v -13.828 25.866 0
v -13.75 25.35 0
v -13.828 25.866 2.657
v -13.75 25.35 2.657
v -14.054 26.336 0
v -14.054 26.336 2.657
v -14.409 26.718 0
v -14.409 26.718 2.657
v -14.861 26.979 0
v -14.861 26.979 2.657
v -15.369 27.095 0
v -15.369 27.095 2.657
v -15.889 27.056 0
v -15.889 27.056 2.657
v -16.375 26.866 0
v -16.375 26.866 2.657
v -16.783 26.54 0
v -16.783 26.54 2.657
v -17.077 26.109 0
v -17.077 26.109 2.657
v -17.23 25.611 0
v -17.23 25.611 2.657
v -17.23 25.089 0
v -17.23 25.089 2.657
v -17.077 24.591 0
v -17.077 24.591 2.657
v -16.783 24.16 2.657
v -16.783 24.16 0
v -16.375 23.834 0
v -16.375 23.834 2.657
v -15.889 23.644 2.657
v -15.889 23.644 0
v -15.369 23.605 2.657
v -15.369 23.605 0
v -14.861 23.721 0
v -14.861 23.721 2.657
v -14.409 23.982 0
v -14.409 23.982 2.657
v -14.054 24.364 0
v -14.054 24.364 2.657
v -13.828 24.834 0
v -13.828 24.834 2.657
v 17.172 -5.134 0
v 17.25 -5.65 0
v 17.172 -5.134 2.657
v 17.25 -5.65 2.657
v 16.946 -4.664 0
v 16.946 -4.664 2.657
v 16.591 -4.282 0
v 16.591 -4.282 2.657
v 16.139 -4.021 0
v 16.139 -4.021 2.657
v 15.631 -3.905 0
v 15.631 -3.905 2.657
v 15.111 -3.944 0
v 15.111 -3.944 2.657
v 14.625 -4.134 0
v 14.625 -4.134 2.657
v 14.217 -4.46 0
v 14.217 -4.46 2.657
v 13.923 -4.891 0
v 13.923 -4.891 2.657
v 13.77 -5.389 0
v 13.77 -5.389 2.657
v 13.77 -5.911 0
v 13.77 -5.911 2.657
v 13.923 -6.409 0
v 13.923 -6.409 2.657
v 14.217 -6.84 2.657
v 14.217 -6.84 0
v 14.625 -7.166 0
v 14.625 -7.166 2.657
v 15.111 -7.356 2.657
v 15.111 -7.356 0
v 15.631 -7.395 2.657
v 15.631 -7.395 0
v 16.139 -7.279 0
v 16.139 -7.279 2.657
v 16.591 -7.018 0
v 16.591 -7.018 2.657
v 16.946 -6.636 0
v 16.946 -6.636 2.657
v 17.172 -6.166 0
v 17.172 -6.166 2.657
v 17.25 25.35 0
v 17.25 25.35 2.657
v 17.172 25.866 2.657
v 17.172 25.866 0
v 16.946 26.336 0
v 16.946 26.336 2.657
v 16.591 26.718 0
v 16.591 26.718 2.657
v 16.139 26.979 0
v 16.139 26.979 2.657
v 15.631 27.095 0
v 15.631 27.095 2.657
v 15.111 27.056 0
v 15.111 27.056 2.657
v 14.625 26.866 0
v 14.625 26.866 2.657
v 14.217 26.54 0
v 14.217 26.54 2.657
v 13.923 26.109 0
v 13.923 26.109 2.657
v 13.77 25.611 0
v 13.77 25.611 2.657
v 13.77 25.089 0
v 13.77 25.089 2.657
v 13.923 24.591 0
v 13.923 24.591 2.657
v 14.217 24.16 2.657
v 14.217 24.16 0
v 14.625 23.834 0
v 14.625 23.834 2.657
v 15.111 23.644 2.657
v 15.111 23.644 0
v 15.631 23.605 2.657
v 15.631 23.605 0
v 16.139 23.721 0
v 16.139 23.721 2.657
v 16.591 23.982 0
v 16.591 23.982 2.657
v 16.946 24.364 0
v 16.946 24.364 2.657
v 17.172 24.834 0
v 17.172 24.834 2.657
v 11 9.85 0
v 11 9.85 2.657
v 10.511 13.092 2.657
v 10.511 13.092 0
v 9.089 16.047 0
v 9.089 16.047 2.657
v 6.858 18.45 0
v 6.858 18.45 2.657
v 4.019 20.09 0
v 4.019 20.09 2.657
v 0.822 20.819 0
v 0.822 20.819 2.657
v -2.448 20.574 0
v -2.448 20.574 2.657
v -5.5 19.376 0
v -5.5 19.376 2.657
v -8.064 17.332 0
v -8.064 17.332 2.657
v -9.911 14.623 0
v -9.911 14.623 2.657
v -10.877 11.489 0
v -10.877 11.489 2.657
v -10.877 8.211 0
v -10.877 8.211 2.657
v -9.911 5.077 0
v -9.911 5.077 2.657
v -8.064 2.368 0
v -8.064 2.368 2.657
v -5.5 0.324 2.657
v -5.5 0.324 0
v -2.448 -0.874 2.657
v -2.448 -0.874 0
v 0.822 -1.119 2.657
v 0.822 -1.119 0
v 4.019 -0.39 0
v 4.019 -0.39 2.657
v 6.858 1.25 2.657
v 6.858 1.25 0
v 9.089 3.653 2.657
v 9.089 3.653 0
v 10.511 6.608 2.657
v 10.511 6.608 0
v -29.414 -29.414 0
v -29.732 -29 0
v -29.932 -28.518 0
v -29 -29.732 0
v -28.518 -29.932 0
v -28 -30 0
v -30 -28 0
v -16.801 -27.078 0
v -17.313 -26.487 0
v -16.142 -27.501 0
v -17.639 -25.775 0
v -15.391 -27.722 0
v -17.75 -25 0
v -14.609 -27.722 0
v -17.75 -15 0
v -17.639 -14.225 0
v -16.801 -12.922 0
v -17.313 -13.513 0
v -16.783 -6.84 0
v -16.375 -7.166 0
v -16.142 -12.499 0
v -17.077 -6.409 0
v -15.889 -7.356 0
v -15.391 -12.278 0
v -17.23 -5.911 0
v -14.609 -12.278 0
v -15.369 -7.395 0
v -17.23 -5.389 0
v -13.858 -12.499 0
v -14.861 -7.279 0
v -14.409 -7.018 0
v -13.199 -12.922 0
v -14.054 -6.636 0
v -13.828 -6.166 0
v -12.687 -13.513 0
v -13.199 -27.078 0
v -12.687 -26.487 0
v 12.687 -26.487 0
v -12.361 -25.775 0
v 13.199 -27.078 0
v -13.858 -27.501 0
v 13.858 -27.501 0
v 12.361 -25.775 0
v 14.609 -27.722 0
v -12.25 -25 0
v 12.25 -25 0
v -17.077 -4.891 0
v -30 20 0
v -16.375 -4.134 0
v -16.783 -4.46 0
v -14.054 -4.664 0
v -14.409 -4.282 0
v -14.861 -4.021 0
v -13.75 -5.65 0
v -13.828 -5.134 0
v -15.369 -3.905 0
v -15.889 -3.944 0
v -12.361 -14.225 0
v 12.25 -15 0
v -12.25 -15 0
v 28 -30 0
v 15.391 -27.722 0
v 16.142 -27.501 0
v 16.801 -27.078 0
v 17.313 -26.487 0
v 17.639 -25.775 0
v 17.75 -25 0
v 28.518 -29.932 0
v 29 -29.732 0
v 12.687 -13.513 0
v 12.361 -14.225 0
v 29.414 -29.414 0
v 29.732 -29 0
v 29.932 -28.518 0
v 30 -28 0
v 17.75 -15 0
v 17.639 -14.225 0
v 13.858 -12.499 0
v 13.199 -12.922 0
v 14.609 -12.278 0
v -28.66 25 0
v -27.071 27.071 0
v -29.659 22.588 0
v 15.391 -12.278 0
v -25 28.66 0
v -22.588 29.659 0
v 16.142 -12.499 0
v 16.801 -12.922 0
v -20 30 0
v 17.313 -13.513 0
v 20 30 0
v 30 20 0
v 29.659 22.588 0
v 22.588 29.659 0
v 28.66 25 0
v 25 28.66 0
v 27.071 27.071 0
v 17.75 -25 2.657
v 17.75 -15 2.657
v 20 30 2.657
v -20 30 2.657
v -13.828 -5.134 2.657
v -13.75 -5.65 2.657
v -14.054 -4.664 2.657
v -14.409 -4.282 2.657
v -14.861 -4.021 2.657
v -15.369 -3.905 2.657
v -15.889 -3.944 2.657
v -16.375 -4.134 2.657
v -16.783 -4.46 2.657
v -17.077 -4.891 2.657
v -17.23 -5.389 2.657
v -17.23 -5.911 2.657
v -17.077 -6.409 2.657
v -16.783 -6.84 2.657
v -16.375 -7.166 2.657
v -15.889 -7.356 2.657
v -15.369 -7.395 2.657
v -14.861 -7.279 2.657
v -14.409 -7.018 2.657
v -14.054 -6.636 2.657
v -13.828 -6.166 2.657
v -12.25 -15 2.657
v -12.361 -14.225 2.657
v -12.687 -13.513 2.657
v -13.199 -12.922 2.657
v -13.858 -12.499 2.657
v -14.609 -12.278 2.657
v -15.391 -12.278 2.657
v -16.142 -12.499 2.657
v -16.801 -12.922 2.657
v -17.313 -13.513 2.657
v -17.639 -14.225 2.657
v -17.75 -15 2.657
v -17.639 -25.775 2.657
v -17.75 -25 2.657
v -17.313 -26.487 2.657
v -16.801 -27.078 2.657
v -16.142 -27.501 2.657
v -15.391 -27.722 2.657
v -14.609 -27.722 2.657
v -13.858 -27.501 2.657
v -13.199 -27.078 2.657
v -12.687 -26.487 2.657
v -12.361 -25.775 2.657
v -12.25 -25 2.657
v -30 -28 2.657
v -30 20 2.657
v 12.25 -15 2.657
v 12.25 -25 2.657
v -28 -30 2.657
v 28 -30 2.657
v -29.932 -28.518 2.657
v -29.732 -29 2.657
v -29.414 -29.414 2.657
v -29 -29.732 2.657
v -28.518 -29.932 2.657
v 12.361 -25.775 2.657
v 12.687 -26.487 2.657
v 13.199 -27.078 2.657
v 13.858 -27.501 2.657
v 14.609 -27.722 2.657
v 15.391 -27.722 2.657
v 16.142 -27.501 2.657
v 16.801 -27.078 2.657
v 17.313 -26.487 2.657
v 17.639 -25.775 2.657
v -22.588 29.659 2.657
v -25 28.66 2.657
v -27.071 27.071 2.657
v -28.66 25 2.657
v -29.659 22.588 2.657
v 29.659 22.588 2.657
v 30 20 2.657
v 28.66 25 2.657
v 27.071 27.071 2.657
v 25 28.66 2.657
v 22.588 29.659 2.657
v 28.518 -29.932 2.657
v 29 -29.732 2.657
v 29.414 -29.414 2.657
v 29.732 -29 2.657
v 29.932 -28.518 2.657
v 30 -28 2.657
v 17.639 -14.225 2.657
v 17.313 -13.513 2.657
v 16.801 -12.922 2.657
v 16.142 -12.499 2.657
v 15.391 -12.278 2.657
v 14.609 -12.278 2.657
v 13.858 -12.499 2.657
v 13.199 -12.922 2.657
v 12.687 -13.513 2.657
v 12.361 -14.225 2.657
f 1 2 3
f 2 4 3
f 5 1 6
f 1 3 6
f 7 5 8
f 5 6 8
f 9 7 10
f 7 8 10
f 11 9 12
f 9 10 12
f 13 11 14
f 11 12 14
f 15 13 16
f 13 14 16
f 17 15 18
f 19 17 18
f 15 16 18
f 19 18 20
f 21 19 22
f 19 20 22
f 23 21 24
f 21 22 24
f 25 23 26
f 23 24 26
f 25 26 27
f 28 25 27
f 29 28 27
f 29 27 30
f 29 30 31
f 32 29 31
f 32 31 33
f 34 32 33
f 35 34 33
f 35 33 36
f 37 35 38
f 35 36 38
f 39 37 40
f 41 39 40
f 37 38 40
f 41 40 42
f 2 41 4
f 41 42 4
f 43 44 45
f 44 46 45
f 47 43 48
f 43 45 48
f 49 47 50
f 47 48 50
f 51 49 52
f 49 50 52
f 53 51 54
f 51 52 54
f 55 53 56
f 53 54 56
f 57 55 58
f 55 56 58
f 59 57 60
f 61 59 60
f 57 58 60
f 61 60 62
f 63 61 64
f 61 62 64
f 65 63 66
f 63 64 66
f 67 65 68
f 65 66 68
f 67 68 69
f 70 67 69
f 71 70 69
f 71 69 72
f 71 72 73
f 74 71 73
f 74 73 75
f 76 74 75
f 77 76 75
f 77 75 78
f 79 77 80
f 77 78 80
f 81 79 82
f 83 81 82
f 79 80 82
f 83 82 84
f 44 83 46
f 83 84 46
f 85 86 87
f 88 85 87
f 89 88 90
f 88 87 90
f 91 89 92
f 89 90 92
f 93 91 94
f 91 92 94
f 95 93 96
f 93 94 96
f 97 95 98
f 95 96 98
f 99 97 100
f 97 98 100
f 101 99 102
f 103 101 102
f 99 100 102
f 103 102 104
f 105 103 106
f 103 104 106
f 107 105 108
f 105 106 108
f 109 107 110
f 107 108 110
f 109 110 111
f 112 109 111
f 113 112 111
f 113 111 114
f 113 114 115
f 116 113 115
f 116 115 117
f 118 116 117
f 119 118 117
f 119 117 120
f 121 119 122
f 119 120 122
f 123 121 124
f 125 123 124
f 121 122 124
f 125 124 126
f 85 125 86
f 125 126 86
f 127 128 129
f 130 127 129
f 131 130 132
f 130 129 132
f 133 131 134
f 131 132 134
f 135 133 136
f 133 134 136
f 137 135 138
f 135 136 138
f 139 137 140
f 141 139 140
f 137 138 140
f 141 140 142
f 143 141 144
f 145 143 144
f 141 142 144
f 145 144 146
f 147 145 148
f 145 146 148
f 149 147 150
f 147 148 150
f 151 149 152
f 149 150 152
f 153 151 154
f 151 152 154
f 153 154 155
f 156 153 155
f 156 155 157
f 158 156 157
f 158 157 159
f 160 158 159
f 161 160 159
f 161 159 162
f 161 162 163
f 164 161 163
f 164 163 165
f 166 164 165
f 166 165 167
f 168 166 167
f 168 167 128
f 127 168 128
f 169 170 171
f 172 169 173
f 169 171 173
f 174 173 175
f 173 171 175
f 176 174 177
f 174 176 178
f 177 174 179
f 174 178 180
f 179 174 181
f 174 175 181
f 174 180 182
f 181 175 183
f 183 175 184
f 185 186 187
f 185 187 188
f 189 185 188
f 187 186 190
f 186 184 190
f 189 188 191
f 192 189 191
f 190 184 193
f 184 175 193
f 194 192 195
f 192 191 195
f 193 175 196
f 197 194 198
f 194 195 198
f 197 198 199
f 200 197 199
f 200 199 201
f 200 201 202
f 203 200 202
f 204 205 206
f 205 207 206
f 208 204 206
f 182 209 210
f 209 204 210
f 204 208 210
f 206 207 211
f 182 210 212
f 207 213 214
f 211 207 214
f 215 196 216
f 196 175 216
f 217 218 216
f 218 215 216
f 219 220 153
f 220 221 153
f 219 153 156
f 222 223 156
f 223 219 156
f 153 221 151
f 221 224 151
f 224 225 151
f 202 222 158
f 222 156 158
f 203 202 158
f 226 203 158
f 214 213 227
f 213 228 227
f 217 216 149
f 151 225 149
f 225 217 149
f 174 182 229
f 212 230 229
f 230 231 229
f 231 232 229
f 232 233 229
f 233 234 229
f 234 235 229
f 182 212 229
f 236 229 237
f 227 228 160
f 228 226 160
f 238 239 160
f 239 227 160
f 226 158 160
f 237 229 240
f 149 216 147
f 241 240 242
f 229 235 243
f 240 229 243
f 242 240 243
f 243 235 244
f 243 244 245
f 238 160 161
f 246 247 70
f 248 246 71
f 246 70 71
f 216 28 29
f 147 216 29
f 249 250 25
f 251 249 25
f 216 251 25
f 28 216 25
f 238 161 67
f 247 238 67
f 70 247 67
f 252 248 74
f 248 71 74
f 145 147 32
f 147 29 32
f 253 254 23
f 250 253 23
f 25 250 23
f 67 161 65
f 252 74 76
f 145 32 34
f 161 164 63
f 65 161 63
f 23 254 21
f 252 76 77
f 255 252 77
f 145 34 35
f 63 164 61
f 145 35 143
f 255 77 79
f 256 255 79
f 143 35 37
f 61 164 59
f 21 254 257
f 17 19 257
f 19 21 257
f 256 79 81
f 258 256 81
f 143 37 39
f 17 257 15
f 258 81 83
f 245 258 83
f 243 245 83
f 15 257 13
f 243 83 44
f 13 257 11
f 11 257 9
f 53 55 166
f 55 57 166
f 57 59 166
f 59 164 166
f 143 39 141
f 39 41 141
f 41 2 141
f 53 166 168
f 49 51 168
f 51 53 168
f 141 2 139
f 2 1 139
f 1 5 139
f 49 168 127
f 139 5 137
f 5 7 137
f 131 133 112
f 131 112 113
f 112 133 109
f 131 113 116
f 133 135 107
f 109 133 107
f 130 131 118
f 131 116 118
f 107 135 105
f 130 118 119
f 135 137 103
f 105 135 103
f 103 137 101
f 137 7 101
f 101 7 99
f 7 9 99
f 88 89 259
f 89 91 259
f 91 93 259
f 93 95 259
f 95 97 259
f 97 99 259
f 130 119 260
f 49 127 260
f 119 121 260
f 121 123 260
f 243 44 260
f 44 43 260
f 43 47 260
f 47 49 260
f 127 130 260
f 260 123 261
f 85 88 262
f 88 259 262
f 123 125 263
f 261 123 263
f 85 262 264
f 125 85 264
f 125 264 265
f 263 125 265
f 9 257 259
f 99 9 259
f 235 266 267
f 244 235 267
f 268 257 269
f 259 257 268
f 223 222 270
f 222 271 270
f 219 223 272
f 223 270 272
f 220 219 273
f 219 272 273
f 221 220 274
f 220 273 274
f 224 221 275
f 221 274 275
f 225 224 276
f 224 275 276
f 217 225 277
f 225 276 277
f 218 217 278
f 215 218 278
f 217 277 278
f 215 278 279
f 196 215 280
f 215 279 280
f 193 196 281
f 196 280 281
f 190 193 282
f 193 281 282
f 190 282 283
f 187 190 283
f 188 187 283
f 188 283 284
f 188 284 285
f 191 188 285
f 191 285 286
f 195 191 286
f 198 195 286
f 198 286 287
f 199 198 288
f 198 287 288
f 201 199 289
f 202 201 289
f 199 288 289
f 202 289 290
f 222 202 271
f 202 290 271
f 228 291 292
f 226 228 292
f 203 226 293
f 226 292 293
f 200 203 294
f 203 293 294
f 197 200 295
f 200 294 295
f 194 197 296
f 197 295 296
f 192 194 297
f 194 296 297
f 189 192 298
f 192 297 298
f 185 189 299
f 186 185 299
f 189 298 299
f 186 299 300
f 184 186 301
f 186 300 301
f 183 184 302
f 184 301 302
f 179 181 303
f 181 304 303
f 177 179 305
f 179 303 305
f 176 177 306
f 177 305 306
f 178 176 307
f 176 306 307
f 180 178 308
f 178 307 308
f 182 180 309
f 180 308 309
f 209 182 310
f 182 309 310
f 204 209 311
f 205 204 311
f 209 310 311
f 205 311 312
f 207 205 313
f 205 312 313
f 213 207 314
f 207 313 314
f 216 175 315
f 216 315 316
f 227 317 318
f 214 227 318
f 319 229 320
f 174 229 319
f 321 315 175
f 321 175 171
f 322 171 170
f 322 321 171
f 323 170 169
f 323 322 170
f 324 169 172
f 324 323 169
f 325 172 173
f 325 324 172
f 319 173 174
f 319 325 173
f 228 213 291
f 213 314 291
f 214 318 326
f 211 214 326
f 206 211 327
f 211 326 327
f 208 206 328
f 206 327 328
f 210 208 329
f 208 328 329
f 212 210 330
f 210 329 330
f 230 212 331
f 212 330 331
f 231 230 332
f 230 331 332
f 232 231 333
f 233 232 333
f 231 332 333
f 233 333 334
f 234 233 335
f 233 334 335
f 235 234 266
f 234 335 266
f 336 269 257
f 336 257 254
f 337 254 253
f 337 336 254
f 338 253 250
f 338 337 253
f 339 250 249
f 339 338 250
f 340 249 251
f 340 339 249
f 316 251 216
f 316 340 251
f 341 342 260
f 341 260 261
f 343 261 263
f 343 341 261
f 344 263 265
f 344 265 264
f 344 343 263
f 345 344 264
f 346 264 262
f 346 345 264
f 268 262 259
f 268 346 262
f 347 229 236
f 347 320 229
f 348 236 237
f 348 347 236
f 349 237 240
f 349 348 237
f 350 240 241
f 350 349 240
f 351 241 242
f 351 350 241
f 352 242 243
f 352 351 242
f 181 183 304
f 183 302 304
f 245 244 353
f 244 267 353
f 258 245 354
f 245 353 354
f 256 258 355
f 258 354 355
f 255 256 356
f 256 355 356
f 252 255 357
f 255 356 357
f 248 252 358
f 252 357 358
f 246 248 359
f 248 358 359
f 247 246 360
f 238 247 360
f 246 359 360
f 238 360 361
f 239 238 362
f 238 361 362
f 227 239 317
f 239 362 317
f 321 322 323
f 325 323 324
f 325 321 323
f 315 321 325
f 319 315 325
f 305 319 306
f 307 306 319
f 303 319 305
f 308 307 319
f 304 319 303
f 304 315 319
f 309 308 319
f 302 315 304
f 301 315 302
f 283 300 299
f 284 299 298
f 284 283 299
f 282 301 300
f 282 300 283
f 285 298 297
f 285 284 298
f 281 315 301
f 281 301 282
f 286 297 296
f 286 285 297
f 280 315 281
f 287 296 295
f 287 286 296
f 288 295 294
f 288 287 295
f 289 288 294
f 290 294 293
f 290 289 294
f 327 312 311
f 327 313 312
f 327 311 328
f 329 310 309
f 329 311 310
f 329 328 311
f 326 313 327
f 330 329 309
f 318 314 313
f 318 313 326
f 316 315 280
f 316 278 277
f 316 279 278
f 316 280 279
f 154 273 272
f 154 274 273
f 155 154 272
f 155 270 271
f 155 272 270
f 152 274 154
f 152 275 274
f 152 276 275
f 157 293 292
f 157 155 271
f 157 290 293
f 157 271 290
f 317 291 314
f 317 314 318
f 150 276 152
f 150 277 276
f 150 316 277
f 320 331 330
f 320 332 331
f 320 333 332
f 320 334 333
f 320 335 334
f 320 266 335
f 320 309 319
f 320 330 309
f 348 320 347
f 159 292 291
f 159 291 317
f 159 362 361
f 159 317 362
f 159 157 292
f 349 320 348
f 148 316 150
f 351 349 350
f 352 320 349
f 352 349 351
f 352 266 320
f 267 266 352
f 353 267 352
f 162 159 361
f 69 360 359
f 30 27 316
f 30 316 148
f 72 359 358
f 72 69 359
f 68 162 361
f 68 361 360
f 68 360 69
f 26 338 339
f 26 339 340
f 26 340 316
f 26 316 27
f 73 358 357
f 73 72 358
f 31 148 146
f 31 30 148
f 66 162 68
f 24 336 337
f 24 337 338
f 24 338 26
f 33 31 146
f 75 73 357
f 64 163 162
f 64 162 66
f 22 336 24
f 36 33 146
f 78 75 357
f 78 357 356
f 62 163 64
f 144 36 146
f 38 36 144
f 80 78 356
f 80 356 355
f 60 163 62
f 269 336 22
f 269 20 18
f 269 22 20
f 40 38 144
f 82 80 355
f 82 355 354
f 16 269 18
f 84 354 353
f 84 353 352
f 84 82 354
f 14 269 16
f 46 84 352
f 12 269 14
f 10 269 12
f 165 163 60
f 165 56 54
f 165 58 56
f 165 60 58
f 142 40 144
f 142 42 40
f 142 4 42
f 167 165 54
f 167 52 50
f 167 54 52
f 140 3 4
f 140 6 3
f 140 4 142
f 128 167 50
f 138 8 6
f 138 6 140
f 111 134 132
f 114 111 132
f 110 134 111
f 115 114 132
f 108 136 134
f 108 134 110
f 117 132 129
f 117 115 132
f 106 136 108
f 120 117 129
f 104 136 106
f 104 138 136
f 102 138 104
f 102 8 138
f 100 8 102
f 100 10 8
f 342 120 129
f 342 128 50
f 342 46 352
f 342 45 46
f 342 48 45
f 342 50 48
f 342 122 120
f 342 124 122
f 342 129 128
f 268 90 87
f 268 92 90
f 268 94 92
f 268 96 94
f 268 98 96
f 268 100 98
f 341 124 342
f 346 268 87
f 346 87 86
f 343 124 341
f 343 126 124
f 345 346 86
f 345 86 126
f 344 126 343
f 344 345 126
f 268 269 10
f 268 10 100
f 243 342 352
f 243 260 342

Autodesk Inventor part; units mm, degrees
ref_plane "YZ Plane" through (0, 0, 0) normal (1, 0, 0) x (0, 1, 0)
ref_plane "XZ Plane" through (0, 0, 0) normal (0, 1, 0) x (-1, 0, 0)
ref_plane "XY Plane" through (0, 0, 0) normal (0, 0, 1) x (1, 0, 0)
sketch "Sketch1" plane through (0, 0, 0) normal (0, 0, 1) x (1, 0, 0)
  line L0 (-30, 30) -> (30, 30)
  line L1 (30, 30) -> (30, -30)
  line L2 (30, -30) -> (-30, -30)
  line L3 (-30, -30) -> (-30, 30)
  point P0 (0, 0)
  dimension "d0" = 60
  dimension "d1" = 60
  dimension "d2" = 30
  dimension "d3" = 30
extrude "Extrusion1" add sketch "Sketch1" along normal blind 2.6568
fillet "Fillet1" radius 2 2 edges at (30, -30, 1.3284) (-30, -30, 1.3284)
sketch "Sketch3" plane through (0, 0, 2.6568) normal (0, 0, 1) x (1, 0, 0)
  line L0 (-28, -30) -> (28, -30) projected
  line L1 (30, -28) -> (30, 30) projected
  line L2 (-30, 30) -> (-30, -28) projected
  line L3 (-15, -15) -> (-15, -25) construction
  line L4 (-17.75, -15) -> (-17.75, -25)
  line L5 (-12.25, -25) -> (-12.25, -15)
  arc A0 (-12.25, -15) -> (-17.75, -15) centre (-15, -15) ccw
  arc A1 (-17.75, -25) -> (-12.25, -25) centre (-15, -25) ccw
  line L6 (15, -15) -> (15, -25) construction
  line L7 (12.25, -15) -> (12.25, -25)
  line L8 (17.75, -25) -> (17.75, -15)
  arc A2 (17.75, -15) -> (12.25, -15) centre (15, -15) ccw
  arc A3 (12.25, -25) -> (17.75, -25) centre (15, -25) ccw
  point P0 (0, 0)
  point P1 (-15, -20)
  point P2 (15, -20)
  dimension "d14" = 10
  dimension "d15" = 5.5
  dimension "d16" = 5
  dimension "d17" = 15
  dimension "d18" = 5.5
  dimension "d19" = 45
  dimension "d20" = 10
  dimension "d21" = 5
extrude "Extrusion3" cut sketch "Sketch3" against normal through all
sketch "Sketch4" plane through (0, 0, 2.6568) normal (0, 0, 1) x (1, 0, 0)
  line L0 (30, -28) -> (30, 30) projected
  circle A0 centre (0, 9.85) radius 11
  line L1 (-28, -30) -> (28, -30) projected
  point P0 (0, 0)
  dimension "d24" = 22
  dimension "d25" = 30
  dimension "d31" = 39.85
extrude "Extrusion4" cut sketch "Sketch4" against normal blind 7
sketch "Sketch6" plane through (0, 0, 2.6568) normal (0, 0, 1) x (1, 0, 0)
  circle A0 centre (-15.5, -5.65) radius 1.75
  circle A1 centre (0, 9.85) radius 11 projected
  point P0 (0, 0)
  dimension "d32" = 3.5
  dimension "d44" = 15.5
  dimension "d45" = 15.5
extrude "Extrusion6" cut sketch "Sketch6" against normal through all contours A0
pattern_linear "Rectangular Pattern1" count 2 spacing 31 along (1, 0, 0) count 2 spacing 31 along (0, 1, 0) of "Extrusion6"
fillet "Fillet2" radius 10 2 edges at (30, 30, 1.3284) (-30, 30, 1.3284)
equation "\"d2\" = 0.5 * d0"
equation "\"d3\" = 0.5 * d1"
properties part number "nema17_y_axis_motor_mount_12ga" material "UHMW, Black"
